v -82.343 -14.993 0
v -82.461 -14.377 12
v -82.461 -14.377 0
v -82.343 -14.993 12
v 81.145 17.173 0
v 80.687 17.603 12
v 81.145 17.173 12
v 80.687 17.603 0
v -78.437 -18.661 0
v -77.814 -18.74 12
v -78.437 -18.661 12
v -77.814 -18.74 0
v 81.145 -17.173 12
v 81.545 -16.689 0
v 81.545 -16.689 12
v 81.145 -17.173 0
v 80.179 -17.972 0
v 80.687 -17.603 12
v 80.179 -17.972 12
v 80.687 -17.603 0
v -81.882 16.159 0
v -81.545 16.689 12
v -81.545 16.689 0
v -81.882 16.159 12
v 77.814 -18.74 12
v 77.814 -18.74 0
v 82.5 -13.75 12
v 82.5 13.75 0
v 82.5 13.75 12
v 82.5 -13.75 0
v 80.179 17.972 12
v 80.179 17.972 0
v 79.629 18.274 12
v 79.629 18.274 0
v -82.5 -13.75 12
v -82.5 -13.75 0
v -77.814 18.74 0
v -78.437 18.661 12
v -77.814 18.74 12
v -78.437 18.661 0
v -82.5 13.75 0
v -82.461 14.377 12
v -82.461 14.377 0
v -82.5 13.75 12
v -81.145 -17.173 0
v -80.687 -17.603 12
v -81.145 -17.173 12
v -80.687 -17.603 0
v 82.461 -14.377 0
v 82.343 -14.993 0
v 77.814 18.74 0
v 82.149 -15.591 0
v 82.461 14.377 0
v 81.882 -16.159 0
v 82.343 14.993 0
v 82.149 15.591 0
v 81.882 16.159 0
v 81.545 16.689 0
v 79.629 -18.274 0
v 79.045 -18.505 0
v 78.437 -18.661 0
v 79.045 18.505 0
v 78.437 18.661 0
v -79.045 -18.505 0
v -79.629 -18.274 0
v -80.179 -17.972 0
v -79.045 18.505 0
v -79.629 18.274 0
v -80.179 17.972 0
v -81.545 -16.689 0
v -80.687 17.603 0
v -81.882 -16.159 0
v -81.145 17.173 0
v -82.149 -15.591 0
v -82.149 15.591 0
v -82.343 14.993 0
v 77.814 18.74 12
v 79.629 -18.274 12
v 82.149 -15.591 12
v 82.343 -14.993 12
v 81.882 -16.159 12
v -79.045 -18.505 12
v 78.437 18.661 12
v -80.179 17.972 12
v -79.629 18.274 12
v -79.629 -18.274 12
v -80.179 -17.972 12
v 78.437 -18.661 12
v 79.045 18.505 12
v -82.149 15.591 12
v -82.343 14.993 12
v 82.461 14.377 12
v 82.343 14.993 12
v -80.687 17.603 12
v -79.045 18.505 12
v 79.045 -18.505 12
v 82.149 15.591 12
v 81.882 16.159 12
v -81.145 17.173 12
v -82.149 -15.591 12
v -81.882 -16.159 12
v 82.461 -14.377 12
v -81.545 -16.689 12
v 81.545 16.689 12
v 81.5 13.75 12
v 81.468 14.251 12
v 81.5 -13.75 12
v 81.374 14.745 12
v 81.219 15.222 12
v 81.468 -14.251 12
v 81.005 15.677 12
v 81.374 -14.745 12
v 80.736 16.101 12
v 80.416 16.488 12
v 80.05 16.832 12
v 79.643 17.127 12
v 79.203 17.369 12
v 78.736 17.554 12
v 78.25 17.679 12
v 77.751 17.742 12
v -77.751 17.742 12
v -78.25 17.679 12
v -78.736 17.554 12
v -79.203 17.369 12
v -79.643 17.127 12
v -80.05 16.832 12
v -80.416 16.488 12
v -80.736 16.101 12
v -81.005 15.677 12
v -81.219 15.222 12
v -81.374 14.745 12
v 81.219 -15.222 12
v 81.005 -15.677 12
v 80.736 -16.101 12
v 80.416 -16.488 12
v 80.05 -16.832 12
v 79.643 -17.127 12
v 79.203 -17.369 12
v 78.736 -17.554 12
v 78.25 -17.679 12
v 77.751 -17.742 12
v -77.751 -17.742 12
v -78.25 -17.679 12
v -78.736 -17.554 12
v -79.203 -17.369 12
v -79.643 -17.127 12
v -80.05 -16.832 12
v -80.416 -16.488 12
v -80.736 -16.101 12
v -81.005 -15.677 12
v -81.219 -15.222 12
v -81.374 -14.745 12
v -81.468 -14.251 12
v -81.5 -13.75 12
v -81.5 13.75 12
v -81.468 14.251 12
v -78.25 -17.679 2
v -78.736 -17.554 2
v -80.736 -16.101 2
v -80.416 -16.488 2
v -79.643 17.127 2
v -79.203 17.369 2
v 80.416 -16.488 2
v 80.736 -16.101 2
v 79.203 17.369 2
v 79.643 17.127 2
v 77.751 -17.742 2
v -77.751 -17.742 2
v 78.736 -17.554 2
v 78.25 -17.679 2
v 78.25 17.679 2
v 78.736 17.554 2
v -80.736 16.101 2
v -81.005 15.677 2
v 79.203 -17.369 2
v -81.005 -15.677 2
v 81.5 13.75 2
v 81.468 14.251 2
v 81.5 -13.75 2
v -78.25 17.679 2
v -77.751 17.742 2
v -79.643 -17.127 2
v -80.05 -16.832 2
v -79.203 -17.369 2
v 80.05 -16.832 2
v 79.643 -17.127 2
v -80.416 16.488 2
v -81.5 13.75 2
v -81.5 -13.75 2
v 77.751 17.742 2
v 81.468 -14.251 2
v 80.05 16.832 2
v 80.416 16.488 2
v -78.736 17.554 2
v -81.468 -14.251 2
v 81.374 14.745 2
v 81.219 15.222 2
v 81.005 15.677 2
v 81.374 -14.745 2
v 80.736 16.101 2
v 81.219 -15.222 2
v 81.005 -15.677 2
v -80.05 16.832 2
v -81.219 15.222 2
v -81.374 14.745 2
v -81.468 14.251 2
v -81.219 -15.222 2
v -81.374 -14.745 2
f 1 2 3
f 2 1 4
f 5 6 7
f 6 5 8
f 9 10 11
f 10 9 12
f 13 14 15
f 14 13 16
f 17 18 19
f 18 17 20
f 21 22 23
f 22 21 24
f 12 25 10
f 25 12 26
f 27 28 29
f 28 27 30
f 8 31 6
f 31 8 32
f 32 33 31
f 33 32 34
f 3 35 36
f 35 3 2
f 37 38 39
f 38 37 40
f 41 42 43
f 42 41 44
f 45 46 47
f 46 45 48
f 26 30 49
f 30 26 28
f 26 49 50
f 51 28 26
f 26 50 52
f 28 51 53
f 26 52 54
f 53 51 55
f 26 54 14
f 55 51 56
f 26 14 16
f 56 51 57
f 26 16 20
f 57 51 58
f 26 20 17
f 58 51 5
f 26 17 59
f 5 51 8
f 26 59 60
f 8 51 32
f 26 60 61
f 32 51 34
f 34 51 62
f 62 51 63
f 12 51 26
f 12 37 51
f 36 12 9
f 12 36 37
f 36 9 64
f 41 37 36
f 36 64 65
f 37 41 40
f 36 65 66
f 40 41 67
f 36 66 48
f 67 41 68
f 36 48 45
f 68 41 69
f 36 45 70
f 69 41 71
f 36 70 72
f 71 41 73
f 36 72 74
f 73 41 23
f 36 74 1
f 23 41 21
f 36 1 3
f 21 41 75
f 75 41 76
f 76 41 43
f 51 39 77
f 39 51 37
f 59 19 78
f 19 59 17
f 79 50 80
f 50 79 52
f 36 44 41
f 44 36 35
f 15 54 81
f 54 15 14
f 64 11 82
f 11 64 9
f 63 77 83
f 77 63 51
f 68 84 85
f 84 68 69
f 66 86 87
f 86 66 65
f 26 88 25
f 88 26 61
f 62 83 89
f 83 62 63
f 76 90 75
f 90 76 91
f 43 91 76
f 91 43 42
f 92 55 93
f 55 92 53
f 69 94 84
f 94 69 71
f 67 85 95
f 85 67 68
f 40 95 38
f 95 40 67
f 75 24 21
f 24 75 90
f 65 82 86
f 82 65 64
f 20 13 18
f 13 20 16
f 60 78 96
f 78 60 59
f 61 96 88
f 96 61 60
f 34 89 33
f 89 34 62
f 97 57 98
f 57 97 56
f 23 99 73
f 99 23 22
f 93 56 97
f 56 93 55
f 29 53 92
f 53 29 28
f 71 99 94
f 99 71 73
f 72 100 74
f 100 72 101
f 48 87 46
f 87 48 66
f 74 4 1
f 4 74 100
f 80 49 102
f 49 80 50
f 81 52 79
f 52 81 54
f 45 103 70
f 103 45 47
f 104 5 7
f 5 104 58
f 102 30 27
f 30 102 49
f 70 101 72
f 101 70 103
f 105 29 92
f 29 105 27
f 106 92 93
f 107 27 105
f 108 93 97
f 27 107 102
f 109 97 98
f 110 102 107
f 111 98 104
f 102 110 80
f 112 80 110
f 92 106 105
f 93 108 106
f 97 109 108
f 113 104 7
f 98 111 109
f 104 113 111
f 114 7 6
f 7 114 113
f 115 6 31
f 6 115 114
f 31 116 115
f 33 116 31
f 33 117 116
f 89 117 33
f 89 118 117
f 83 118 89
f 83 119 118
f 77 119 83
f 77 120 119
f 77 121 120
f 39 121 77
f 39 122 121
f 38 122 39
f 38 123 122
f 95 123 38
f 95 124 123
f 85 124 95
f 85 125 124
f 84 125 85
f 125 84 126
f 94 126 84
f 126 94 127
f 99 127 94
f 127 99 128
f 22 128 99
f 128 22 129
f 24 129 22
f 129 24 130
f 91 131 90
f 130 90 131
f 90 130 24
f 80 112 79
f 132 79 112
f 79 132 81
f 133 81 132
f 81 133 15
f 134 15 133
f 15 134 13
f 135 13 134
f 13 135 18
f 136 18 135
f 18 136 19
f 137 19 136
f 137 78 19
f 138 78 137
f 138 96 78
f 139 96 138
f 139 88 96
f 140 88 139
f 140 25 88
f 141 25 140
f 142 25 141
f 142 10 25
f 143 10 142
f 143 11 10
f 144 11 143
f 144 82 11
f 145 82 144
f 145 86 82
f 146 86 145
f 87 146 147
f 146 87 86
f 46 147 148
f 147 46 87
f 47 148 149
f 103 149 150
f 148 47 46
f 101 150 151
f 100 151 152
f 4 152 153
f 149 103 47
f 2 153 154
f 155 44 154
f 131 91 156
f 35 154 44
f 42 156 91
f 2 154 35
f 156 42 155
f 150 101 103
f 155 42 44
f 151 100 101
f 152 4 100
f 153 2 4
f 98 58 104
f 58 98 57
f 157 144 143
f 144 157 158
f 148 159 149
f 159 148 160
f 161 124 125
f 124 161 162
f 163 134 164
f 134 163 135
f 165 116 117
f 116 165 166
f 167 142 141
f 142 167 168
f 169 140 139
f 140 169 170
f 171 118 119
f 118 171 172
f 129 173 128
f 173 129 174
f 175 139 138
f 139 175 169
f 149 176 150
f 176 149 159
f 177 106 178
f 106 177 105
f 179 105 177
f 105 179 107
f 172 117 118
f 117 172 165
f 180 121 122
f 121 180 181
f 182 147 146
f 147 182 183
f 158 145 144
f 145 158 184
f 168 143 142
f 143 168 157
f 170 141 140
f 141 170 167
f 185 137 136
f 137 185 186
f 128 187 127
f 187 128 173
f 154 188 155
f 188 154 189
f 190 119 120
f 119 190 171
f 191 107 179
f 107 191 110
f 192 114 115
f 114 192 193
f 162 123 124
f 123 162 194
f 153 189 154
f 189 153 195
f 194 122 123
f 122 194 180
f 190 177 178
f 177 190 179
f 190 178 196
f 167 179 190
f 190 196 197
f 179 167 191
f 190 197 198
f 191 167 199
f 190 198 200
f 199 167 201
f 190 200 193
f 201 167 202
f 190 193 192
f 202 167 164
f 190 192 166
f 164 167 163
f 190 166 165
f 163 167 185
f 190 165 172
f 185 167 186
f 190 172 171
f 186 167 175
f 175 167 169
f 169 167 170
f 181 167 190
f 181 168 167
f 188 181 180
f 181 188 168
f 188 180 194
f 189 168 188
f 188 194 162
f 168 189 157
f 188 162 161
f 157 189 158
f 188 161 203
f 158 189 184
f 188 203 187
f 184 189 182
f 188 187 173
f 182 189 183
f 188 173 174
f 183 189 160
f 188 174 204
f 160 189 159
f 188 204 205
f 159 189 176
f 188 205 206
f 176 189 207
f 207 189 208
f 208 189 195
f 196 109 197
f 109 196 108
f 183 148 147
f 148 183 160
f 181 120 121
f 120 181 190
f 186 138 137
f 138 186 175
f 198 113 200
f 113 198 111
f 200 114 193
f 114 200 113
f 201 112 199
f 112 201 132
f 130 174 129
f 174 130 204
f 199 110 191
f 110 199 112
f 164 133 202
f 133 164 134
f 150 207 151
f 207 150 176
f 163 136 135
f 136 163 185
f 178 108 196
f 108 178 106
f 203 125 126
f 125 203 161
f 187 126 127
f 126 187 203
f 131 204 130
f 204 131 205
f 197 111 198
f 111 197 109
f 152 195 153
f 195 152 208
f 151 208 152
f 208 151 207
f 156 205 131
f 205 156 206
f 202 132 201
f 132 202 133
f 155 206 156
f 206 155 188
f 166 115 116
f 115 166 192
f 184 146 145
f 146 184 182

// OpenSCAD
$fn = 50;


difference() {
	union() {
		hull() {
			translate(v = [-77.5000000000, 13.7500000000, 0]) {
				cylinder(h = 12, r = 5);
			}
			translate(v = [77.5000000000, 13.7500000000, 0]) {
				cylinder(h = 12, r = 5);
			}
			translate(v = [-77.5000000000, -13.7500000000, 0]) {
				cylinder(h = 12, r = 5);
			}
			translate(v = [77.5000000000, -13.7500000000, 0]) {
				cylinder(h = 12, r = 5);
			}
		}
	}
	union() {
		translate(v = [0, 0, 2]) {
			hull() {
				translate(v = [-77.5000000000, 13.7500000000, 0]) {
					cylinder(h = 10, r = 4);
				}
				translate(v = [77.5000000000, 13.7500000000, 0]) {
					cylinder(h = 10, r = 4);
				}
				translate(v = [-77.5000000000, -13.7500000000, 0]) {
					cylinder(h = 10, r = 4);
				}
				translate(v = [77.5000000000, -13.7500000000, 0]) {
					cylinder(h = 10, r = 4);
				}
			}
		}
	}
}
